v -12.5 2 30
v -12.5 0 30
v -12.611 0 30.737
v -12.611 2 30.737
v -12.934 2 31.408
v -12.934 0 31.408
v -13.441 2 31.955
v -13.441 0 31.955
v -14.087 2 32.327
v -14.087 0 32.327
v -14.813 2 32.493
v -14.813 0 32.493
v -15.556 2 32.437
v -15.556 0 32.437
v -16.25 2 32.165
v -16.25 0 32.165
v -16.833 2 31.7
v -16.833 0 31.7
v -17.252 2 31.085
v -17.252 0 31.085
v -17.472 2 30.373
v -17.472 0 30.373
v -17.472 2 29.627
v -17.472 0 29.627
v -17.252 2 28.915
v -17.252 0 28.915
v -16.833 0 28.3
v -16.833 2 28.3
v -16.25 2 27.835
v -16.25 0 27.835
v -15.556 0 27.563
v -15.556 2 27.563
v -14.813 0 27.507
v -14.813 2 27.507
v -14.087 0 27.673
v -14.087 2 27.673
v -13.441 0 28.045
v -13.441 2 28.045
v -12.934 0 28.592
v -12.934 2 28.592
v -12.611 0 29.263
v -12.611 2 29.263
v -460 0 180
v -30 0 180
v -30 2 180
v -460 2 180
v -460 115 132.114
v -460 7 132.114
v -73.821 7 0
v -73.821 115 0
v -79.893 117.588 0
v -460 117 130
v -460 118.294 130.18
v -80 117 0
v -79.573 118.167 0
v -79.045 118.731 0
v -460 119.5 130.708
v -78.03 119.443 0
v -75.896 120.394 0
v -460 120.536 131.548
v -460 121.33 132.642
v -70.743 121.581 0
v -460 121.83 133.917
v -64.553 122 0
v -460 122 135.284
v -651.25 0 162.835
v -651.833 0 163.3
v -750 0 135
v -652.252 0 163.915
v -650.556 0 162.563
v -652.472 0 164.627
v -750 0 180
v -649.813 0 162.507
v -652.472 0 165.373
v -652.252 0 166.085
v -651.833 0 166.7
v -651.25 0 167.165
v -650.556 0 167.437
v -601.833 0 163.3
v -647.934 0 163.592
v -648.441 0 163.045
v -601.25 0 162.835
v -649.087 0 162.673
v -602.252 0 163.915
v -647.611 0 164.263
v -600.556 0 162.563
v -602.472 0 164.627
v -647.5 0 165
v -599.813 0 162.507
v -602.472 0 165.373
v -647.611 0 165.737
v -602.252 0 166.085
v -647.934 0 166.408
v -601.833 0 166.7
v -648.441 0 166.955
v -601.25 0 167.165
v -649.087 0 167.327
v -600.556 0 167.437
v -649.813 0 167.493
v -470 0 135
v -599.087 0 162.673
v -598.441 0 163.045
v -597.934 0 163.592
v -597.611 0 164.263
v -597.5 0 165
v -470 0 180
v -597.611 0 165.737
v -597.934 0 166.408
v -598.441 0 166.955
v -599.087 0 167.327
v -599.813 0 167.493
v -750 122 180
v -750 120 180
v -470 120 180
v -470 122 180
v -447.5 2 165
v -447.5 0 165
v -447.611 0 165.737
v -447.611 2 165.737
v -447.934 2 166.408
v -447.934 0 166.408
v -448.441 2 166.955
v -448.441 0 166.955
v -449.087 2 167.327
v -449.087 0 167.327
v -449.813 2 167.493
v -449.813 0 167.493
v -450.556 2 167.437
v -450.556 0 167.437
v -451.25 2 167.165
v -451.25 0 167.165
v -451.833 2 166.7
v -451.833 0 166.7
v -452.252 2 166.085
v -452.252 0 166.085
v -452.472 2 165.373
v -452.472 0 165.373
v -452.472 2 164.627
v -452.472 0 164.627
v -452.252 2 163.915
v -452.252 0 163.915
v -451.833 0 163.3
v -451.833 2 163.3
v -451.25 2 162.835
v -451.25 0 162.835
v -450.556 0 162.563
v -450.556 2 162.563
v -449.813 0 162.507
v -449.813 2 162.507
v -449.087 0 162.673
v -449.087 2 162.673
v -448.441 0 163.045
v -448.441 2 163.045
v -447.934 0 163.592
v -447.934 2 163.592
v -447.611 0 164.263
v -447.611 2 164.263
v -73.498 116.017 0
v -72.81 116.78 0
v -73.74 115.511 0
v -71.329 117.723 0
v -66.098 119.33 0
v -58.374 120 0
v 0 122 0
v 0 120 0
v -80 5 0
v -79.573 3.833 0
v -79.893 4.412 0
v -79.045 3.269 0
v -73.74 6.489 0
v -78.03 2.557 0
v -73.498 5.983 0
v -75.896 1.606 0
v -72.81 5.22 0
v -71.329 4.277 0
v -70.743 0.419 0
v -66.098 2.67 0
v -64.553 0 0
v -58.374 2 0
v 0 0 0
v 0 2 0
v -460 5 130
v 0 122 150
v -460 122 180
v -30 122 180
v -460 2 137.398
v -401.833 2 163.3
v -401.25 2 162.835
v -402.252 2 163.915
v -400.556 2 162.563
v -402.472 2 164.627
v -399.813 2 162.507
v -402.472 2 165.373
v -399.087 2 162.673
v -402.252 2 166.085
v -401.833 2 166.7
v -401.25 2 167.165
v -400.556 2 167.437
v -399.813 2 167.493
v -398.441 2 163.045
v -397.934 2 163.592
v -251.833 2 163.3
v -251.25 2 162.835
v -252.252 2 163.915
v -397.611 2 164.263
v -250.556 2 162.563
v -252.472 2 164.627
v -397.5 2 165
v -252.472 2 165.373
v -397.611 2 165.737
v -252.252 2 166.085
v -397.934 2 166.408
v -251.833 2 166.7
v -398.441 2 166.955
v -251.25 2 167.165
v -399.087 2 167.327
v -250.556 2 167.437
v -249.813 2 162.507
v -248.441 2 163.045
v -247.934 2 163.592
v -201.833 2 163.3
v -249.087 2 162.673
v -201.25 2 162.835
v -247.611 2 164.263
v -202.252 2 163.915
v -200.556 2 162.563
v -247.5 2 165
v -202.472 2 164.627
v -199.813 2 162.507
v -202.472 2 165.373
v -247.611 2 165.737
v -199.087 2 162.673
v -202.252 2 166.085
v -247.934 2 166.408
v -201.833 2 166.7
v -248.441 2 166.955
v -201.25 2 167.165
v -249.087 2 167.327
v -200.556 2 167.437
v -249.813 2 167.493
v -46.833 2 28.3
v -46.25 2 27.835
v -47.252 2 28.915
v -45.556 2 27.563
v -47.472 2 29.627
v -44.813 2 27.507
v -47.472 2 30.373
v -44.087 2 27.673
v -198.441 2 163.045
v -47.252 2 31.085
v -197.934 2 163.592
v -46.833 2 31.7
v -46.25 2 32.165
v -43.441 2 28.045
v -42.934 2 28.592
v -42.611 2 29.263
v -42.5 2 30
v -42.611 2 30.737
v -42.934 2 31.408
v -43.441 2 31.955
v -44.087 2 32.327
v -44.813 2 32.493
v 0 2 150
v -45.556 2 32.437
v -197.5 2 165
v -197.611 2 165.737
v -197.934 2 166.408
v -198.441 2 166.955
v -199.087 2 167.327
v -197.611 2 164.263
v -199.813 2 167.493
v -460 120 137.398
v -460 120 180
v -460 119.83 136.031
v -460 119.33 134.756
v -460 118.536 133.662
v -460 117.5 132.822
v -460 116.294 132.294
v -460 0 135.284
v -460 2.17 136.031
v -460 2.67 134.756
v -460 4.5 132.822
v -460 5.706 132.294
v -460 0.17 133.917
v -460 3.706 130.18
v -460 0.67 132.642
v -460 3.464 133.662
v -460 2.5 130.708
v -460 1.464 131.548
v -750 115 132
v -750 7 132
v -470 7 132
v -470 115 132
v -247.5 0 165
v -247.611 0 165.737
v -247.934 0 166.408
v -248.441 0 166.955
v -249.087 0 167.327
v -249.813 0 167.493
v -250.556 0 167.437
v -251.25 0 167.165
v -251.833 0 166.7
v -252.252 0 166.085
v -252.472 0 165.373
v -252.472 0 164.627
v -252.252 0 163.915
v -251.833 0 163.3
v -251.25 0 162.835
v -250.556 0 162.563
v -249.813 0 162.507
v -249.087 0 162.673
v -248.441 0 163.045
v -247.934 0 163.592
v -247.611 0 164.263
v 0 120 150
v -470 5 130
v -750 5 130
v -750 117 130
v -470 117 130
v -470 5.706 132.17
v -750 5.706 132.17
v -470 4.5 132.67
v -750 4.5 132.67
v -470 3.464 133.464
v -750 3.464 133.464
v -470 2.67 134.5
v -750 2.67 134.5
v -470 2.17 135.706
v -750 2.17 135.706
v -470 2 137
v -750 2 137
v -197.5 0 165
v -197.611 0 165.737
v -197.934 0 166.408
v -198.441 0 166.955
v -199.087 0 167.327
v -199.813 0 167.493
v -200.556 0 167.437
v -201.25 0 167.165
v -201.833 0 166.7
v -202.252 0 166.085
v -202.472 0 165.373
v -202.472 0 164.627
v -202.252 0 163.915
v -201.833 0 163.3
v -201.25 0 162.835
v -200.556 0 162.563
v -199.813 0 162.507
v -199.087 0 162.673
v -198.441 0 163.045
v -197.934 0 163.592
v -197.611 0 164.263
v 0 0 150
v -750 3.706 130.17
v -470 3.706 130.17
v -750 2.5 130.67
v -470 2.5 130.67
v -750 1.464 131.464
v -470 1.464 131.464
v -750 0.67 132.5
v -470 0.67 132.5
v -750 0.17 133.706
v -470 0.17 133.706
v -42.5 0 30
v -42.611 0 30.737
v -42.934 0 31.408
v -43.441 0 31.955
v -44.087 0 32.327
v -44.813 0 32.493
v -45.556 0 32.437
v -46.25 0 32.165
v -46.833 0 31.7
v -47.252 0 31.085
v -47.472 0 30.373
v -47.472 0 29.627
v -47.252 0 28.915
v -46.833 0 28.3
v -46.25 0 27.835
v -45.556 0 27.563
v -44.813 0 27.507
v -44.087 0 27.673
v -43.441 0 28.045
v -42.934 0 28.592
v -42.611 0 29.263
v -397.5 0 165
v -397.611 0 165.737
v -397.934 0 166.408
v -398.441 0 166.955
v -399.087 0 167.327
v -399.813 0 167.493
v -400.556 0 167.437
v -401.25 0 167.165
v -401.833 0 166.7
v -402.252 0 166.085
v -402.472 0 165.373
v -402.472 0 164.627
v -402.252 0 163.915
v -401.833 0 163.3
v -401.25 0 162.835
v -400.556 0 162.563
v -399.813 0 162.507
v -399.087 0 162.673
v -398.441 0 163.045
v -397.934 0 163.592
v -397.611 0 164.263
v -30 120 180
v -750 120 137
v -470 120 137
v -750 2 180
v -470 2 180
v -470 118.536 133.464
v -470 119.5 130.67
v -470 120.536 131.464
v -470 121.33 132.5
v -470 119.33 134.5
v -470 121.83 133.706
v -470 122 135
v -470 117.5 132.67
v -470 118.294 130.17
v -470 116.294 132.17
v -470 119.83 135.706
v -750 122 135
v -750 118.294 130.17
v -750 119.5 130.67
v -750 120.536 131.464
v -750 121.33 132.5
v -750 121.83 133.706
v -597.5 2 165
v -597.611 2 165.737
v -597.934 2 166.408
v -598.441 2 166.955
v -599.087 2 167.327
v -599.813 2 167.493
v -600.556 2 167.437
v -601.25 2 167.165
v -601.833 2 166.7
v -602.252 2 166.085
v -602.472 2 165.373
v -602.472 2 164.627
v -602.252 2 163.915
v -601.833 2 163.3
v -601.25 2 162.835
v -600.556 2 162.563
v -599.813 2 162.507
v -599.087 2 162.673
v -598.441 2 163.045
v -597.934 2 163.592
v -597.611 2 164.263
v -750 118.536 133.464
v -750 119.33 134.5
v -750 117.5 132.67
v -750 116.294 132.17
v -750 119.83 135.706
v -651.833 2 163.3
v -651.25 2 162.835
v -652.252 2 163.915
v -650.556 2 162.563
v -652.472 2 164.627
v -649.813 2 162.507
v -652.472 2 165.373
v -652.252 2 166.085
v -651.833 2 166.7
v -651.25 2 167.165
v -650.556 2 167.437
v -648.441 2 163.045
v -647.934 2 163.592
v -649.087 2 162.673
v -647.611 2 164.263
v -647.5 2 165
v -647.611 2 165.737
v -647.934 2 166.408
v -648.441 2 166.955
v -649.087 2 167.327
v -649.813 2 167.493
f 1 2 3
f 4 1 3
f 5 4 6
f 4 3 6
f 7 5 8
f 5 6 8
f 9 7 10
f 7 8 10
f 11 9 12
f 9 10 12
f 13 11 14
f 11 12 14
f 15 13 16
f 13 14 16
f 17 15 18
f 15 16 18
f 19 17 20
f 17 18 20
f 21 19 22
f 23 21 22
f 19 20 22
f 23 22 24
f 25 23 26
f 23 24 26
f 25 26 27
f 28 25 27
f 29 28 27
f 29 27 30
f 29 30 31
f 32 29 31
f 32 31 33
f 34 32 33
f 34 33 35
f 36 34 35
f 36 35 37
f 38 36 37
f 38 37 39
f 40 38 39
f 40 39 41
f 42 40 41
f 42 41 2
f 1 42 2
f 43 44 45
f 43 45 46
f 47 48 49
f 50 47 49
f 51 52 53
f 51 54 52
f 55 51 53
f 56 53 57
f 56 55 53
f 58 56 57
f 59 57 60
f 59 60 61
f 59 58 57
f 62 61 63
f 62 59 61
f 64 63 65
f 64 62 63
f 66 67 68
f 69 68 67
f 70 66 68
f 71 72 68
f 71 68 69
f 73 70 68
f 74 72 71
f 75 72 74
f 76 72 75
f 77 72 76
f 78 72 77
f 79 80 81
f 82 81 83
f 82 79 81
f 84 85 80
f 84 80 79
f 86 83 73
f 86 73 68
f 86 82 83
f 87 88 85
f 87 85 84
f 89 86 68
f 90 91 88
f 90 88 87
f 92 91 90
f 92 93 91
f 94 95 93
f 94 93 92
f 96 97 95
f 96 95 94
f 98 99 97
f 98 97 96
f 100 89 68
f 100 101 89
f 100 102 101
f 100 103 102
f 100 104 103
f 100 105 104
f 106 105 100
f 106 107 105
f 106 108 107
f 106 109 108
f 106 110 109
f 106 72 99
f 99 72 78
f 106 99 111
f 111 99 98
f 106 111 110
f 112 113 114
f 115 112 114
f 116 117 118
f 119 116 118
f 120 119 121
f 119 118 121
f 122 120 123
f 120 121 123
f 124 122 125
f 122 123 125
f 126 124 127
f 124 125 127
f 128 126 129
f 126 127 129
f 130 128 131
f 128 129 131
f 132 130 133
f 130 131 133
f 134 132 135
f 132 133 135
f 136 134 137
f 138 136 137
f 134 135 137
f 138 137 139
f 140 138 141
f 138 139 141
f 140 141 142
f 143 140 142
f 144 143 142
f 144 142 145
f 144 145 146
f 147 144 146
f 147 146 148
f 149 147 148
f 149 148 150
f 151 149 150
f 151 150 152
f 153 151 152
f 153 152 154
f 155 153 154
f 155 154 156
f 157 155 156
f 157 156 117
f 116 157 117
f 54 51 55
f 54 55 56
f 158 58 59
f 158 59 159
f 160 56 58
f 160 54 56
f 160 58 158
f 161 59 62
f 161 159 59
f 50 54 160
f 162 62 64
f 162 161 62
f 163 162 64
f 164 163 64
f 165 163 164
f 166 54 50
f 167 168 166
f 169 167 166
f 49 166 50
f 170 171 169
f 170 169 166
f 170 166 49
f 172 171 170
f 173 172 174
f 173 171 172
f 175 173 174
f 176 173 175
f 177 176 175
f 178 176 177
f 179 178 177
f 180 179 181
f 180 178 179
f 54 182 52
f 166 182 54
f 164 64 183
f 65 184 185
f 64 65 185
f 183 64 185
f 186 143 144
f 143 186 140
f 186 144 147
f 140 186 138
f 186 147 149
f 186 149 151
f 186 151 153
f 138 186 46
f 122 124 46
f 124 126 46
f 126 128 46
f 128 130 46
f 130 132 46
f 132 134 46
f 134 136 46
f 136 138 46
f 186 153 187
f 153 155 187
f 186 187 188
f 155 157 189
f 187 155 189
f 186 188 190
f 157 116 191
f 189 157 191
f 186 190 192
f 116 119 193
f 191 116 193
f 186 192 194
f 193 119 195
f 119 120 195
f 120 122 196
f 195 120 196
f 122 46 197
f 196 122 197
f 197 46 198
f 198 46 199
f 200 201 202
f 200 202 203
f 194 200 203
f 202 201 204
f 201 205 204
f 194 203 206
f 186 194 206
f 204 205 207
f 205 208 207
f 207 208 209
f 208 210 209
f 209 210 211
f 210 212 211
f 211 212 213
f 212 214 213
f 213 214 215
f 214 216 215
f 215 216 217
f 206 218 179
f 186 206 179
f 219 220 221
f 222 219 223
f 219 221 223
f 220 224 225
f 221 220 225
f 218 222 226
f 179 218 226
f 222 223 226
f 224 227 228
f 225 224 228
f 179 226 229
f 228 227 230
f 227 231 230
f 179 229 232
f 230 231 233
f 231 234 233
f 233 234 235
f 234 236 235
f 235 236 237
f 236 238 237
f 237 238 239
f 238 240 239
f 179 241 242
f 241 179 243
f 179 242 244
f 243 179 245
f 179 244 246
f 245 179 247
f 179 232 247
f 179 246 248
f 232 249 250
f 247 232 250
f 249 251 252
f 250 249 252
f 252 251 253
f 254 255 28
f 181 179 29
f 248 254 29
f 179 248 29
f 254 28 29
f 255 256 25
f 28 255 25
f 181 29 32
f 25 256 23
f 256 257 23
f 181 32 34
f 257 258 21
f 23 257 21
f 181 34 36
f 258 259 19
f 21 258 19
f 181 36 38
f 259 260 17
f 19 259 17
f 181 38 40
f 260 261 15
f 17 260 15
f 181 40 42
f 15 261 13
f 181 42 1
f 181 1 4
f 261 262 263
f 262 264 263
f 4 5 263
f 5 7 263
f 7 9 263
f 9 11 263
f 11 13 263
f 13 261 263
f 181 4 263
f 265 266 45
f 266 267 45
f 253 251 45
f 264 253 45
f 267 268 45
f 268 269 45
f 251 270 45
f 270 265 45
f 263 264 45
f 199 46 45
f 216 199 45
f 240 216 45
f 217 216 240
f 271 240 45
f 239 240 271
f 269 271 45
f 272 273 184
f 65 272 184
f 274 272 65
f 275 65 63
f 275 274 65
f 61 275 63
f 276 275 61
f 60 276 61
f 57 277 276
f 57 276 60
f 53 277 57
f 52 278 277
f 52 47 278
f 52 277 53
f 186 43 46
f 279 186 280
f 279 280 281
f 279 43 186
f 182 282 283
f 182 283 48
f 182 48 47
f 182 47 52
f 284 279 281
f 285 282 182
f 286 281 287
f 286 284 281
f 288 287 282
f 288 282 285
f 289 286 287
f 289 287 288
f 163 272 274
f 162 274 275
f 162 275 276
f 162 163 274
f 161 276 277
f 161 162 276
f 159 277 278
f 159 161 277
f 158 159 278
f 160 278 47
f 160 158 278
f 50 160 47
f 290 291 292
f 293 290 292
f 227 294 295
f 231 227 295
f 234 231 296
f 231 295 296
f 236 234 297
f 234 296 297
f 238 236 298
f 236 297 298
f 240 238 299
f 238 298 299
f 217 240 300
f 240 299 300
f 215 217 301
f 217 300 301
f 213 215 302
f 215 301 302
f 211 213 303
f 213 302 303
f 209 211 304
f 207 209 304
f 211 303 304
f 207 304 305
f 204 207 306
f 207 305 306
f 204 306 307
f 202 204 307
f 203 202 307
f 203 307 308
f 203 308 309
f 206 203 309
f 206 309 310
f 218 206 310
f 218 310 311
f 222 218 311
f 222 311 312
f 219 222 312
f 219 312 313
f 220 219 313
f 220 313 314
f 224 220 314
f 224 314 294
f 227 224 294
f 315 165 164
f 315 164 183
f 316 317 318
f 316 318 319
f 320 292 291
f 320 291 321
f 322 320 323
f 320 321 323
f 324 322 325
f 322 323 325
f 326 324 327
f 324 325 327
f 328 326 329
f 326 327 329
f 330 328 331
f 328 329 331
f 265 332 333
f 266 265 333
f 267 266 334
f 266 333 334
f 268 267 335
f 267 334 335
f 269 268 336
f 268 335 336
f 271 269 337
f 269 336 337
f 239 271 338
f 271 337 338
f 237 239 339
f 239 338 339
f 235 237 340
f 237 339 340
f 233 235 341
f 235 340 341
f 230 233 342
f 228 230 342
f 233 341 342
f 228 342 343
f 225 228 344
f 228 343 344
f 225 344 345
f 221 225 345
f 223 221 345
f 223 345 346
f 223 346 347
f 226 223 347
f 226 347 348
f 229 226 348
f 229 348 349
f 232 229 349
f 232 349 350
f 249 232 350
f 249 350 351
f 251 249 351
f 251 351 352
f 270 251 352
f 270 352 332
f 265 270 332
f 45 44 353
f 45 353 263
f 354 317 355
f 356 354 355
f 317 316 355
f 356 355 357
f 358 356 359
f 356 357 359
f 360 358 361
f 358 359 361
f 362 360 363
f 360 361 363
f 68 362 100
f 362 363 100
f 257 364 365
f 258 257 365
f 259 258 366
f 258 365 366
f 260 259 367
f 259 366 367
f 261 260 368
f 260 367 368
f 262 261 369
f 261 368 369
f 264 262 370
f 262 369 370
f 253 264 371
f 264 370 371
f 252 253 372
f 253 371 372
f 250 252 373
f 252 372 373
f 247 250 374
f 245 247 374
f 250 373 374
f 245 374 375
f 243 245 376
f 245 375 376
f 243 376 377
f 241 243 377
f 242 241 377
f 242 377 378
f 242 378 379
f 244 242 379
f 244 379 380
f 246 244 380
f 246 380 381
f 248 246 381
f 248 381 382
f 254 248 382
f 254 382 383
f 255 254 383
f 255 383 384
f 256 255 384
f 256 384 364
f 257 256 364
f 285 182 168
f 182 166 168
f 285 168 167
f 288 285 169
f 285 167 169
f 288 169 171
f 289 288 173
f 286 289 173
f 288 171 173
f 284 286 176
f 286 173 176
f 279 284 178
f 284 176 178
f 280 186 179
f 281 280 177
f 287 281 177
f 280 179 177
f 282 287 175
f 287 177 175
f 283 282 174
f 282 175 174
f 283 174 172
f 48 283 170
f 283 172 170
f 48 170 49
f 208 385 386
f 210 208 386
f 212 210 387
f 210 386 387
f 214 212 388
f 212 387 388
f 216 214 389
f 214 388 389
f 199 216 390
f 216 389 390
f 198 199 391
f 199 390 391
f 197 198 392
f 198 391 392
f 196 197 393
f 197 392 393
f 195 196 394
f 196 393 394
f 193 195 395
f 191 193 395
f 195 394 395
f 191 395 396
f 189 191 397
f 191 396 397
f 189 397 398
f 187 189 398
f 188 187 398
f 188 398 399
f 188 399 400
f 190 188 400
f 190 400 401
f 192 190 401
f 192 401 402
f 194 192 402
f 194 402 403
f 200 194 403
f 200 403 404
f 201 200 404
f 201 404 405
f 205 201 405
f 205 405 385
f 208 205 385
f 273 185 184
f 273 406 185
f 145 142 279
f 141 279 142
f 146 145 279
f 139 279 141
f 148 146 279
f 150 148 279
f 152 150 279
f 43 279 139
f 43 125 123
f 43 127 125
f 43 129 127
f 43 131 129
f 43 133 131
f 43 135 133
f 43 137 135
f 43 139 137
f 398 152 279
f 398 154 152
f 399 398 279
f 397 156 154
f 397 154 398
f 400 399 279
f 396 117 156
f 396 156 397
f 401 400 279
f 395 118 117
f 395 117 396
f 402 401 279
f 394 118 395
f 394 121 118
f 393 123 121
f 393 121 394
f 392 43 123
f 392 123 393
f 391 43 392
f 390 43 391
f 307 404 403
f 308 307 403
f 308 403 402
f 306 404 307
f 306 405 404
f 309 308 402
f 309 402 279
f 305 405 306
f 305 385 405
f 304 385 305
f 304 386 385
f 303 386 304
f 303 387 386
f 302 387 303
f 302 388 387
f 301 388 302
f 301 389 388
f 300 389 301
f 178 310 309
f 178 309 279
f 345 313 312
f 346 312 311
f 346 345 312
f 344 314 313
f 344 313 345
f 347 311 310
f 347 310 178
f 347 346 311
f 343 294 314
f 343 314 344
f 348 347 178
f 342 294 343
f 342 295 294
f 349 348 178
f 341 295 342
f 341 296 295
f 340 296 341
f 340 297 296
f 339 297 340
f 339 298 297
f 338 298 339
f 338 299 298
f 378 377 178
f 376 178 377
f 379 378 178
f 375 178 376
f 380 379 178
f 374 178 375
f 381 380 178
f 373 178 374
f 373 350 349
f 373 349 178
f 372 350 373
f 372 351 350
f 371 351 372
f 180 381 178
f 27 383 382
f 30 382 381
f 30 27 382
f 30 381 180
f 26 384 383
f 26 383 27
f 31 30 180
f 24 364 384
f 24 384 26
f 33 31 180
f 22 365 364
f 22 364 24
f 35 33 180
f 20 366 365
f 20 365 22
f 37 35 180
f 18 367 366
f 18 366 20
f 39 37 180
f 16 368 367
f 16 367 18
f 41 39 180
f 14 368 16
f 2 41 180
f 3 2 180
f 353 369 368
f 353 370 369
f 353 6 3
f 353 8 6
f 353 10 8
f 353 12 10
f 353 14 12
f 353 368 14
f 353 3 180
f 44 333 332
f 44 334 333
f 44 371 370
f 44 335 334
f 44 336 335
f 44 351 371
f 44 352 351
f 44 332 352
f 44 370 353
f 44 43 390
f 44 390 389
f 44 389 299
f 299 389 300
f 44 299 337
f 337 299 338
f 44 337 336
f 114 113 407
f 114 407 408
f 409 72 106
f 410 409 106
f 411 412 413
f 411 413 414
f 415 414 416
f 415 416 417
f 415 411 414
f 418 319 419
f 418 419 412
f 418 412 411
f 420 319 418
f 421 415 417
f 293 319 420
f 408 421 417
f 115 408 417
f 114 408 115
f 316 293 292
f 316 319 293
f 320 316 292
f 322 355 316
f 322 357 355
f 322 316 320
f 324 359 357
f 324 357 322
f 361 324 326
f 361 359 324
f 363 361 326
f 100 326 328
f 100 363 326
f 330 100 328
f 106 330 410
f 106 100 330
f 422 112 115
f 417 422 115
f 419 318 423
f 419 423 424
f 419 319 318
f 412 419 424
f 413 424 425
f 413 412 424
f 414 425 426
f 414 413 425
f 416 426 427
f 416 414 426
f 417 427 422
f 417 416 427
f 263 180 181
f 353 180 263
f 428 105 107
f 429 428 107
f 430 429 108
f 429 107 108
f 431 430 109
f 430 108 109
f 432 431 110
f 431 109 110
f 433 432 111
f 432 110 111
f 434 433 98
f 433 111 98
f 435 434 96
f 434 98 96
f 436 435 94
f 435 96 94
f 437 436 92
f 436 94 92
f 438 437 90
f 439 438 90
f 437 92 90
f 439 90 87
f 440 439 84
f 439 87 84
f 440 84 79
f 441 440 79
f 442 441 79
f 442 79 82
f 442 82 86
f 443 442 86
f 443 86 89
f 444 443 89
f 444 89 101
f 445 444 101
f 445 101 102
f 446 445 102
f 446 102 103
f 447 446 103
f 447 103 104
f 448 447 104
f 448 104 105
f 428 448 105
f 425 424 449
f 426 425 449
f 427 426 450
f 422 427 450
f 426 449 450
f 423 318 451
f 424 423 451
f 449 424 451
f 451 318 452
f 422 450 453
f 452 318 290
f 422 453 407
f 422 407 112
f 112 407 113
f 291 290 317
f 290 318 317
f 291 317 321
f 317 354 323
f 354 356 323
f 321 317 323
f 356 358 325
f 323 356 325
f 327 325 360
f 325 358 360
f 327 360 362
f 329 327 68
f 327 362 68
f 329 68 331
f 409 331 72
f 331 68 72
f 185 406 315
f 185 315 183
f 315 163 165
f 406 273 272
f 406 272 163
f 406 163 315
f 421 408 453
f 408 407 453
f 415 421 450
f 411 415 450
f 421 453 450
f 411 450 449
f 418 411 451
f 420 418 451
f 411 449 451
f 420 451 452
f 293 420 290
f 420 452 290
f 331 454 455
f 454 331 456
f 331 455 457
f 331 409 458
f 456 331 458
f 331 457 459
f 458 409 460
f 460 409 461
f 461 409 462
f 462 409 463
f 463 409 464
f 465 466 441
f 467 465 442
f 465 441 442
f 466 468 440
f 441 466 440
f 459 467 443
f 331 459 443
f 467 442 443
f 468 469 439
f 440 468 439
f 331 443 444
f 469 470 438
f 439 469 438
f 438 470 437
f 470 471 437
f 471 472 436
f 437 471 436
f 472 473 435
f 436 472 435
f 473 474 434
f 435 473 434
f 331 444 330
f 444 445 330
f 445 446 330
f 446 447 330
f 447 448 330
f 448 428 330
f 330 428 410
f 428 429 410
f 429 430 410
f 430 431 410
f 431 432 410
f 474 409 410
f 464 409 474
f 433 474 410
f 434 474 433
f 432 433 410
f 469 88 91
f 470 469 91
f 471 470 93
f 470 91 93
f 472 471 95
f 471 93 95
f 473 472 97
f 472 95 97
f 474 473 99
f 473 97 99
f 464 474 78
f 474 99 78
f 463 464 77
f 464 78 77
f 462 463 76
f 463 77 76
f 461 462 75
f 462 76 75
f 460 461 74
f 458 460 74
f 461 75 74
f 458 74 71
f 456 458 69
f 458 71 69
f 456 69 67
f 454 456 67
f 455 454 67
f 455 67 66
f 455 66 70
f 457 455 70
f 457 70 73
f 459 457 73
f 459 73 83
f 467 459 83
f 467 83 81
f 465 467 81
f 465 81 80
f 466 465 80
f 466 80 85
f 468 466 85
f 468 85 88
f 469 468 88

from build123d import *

# Parameters (mm, degrees)
F1_DEPTH = 122
F2_T     = -2
F3_R     = 5
F4_SIZE  = 30
F5_W     = 280
F5_H     = 50
F6_DEPTH = 122
F7_T     = -2
F8_R     = 2.5
F9_DEPTH = 25
F10_R    = 5


with BuildPart() as f1:
    # F0 (on Front) → F1 (new body)
    with BuildSketch(Plane.XZ):
        Polygon((-80, 0), (0, 0), (0, 180), (-460, 180), (-460, 130), align=None)
    extrude(amount=-F1_DEPTH)

    # F2
    f2_openings = [f1.faces().sort_by_distance(p)[0] for p in [
        (-230, 61, 180),
        (0, 61, 90),
        (-40, 61, 0),
        (-460, 61, 155),
    ]]
    offset(amount=F2_T, openings=f2_openings)

    # F3
    f3_edges = [f1.edges().sort_by_distance(p)[0] for p in [
        (-270, 0, 65),
        (-270, 122, 65),
        (-266.910602, 2, 66.056899),
        (-266.910602, 120, 66.056899),
    ]]
    fillet(f3_edges, radius=F3_R)

    # F4
    f4_edges = [f1.edges().sort_by_distance(p)[0] for p in [
        (0, 1, 180),
        (0, 121, 180),
    ]]
    chamfer(f4_edges, length=F4_SIZE)


with BuildPart() as f6:
    # F5 (on Front) → F6 (new body)
    with BuildSketch(Plane.XZ):
        with Locations((-610, 155)):
            Rectangle(F5_W, F5_H)
    extrude(amount=-F6_DEPTH)

    # F7
    f7_openings = [f6.faces().sort_by_distance(p)[0] for p in [
        (-610, 61, 180),
        (-470, 61, 155),
        (-750, 61, 155),
    ]]
    offset(amount=F7_T, openings=f7_openings)


with BuildPart() as f9_tool:
    # F8 (on face) → F9 (new body)
    with BuildSketch(Plane.XZ):
        with Locations((-45, 30)):
            Circle(F8_R)
        with Locations((-15, 30)):
            Circle(F8_R)
        with Locations((-450, 165)):
            Circle(F8_R)
        with Locations((-400, 165)):
            Circle(F8_R)
        with Locations((-250, 165)):
            Circle(F8_R)
        with Locations((-200, 165)):
            Circle(F8_R)
        with Locations((-650, 165)):
            Circle(F8_R)
        with Locations((-600, 165)):
            Circle(F8_R)
    extrude(amount=-F9_DEPTH)


with BuildPart() as f1_1:
    add(f1.part)

    # F9: cut by f9_tool
    add(f9_tool.part, mode=Mode.SUBTRACT)


with BuildPart() as f6_1:
    add(f6.part)

    # F9: cut by f9_tool
    add(f9_tool.part, mode=Mode.SUBTRACT)

    # F10
    f10_edges = [f6_1.edges().sort_by_distance(p)[0] for p in [
        (-610, 0, 130),
        (-610, 122, 130),
        (-610, 120, 132),
        (-610, 2, 132),
    ]]
    fillet(f10_edges, radius=F10_R)


solid = Compound([f1_1.part, f6_1.part])
